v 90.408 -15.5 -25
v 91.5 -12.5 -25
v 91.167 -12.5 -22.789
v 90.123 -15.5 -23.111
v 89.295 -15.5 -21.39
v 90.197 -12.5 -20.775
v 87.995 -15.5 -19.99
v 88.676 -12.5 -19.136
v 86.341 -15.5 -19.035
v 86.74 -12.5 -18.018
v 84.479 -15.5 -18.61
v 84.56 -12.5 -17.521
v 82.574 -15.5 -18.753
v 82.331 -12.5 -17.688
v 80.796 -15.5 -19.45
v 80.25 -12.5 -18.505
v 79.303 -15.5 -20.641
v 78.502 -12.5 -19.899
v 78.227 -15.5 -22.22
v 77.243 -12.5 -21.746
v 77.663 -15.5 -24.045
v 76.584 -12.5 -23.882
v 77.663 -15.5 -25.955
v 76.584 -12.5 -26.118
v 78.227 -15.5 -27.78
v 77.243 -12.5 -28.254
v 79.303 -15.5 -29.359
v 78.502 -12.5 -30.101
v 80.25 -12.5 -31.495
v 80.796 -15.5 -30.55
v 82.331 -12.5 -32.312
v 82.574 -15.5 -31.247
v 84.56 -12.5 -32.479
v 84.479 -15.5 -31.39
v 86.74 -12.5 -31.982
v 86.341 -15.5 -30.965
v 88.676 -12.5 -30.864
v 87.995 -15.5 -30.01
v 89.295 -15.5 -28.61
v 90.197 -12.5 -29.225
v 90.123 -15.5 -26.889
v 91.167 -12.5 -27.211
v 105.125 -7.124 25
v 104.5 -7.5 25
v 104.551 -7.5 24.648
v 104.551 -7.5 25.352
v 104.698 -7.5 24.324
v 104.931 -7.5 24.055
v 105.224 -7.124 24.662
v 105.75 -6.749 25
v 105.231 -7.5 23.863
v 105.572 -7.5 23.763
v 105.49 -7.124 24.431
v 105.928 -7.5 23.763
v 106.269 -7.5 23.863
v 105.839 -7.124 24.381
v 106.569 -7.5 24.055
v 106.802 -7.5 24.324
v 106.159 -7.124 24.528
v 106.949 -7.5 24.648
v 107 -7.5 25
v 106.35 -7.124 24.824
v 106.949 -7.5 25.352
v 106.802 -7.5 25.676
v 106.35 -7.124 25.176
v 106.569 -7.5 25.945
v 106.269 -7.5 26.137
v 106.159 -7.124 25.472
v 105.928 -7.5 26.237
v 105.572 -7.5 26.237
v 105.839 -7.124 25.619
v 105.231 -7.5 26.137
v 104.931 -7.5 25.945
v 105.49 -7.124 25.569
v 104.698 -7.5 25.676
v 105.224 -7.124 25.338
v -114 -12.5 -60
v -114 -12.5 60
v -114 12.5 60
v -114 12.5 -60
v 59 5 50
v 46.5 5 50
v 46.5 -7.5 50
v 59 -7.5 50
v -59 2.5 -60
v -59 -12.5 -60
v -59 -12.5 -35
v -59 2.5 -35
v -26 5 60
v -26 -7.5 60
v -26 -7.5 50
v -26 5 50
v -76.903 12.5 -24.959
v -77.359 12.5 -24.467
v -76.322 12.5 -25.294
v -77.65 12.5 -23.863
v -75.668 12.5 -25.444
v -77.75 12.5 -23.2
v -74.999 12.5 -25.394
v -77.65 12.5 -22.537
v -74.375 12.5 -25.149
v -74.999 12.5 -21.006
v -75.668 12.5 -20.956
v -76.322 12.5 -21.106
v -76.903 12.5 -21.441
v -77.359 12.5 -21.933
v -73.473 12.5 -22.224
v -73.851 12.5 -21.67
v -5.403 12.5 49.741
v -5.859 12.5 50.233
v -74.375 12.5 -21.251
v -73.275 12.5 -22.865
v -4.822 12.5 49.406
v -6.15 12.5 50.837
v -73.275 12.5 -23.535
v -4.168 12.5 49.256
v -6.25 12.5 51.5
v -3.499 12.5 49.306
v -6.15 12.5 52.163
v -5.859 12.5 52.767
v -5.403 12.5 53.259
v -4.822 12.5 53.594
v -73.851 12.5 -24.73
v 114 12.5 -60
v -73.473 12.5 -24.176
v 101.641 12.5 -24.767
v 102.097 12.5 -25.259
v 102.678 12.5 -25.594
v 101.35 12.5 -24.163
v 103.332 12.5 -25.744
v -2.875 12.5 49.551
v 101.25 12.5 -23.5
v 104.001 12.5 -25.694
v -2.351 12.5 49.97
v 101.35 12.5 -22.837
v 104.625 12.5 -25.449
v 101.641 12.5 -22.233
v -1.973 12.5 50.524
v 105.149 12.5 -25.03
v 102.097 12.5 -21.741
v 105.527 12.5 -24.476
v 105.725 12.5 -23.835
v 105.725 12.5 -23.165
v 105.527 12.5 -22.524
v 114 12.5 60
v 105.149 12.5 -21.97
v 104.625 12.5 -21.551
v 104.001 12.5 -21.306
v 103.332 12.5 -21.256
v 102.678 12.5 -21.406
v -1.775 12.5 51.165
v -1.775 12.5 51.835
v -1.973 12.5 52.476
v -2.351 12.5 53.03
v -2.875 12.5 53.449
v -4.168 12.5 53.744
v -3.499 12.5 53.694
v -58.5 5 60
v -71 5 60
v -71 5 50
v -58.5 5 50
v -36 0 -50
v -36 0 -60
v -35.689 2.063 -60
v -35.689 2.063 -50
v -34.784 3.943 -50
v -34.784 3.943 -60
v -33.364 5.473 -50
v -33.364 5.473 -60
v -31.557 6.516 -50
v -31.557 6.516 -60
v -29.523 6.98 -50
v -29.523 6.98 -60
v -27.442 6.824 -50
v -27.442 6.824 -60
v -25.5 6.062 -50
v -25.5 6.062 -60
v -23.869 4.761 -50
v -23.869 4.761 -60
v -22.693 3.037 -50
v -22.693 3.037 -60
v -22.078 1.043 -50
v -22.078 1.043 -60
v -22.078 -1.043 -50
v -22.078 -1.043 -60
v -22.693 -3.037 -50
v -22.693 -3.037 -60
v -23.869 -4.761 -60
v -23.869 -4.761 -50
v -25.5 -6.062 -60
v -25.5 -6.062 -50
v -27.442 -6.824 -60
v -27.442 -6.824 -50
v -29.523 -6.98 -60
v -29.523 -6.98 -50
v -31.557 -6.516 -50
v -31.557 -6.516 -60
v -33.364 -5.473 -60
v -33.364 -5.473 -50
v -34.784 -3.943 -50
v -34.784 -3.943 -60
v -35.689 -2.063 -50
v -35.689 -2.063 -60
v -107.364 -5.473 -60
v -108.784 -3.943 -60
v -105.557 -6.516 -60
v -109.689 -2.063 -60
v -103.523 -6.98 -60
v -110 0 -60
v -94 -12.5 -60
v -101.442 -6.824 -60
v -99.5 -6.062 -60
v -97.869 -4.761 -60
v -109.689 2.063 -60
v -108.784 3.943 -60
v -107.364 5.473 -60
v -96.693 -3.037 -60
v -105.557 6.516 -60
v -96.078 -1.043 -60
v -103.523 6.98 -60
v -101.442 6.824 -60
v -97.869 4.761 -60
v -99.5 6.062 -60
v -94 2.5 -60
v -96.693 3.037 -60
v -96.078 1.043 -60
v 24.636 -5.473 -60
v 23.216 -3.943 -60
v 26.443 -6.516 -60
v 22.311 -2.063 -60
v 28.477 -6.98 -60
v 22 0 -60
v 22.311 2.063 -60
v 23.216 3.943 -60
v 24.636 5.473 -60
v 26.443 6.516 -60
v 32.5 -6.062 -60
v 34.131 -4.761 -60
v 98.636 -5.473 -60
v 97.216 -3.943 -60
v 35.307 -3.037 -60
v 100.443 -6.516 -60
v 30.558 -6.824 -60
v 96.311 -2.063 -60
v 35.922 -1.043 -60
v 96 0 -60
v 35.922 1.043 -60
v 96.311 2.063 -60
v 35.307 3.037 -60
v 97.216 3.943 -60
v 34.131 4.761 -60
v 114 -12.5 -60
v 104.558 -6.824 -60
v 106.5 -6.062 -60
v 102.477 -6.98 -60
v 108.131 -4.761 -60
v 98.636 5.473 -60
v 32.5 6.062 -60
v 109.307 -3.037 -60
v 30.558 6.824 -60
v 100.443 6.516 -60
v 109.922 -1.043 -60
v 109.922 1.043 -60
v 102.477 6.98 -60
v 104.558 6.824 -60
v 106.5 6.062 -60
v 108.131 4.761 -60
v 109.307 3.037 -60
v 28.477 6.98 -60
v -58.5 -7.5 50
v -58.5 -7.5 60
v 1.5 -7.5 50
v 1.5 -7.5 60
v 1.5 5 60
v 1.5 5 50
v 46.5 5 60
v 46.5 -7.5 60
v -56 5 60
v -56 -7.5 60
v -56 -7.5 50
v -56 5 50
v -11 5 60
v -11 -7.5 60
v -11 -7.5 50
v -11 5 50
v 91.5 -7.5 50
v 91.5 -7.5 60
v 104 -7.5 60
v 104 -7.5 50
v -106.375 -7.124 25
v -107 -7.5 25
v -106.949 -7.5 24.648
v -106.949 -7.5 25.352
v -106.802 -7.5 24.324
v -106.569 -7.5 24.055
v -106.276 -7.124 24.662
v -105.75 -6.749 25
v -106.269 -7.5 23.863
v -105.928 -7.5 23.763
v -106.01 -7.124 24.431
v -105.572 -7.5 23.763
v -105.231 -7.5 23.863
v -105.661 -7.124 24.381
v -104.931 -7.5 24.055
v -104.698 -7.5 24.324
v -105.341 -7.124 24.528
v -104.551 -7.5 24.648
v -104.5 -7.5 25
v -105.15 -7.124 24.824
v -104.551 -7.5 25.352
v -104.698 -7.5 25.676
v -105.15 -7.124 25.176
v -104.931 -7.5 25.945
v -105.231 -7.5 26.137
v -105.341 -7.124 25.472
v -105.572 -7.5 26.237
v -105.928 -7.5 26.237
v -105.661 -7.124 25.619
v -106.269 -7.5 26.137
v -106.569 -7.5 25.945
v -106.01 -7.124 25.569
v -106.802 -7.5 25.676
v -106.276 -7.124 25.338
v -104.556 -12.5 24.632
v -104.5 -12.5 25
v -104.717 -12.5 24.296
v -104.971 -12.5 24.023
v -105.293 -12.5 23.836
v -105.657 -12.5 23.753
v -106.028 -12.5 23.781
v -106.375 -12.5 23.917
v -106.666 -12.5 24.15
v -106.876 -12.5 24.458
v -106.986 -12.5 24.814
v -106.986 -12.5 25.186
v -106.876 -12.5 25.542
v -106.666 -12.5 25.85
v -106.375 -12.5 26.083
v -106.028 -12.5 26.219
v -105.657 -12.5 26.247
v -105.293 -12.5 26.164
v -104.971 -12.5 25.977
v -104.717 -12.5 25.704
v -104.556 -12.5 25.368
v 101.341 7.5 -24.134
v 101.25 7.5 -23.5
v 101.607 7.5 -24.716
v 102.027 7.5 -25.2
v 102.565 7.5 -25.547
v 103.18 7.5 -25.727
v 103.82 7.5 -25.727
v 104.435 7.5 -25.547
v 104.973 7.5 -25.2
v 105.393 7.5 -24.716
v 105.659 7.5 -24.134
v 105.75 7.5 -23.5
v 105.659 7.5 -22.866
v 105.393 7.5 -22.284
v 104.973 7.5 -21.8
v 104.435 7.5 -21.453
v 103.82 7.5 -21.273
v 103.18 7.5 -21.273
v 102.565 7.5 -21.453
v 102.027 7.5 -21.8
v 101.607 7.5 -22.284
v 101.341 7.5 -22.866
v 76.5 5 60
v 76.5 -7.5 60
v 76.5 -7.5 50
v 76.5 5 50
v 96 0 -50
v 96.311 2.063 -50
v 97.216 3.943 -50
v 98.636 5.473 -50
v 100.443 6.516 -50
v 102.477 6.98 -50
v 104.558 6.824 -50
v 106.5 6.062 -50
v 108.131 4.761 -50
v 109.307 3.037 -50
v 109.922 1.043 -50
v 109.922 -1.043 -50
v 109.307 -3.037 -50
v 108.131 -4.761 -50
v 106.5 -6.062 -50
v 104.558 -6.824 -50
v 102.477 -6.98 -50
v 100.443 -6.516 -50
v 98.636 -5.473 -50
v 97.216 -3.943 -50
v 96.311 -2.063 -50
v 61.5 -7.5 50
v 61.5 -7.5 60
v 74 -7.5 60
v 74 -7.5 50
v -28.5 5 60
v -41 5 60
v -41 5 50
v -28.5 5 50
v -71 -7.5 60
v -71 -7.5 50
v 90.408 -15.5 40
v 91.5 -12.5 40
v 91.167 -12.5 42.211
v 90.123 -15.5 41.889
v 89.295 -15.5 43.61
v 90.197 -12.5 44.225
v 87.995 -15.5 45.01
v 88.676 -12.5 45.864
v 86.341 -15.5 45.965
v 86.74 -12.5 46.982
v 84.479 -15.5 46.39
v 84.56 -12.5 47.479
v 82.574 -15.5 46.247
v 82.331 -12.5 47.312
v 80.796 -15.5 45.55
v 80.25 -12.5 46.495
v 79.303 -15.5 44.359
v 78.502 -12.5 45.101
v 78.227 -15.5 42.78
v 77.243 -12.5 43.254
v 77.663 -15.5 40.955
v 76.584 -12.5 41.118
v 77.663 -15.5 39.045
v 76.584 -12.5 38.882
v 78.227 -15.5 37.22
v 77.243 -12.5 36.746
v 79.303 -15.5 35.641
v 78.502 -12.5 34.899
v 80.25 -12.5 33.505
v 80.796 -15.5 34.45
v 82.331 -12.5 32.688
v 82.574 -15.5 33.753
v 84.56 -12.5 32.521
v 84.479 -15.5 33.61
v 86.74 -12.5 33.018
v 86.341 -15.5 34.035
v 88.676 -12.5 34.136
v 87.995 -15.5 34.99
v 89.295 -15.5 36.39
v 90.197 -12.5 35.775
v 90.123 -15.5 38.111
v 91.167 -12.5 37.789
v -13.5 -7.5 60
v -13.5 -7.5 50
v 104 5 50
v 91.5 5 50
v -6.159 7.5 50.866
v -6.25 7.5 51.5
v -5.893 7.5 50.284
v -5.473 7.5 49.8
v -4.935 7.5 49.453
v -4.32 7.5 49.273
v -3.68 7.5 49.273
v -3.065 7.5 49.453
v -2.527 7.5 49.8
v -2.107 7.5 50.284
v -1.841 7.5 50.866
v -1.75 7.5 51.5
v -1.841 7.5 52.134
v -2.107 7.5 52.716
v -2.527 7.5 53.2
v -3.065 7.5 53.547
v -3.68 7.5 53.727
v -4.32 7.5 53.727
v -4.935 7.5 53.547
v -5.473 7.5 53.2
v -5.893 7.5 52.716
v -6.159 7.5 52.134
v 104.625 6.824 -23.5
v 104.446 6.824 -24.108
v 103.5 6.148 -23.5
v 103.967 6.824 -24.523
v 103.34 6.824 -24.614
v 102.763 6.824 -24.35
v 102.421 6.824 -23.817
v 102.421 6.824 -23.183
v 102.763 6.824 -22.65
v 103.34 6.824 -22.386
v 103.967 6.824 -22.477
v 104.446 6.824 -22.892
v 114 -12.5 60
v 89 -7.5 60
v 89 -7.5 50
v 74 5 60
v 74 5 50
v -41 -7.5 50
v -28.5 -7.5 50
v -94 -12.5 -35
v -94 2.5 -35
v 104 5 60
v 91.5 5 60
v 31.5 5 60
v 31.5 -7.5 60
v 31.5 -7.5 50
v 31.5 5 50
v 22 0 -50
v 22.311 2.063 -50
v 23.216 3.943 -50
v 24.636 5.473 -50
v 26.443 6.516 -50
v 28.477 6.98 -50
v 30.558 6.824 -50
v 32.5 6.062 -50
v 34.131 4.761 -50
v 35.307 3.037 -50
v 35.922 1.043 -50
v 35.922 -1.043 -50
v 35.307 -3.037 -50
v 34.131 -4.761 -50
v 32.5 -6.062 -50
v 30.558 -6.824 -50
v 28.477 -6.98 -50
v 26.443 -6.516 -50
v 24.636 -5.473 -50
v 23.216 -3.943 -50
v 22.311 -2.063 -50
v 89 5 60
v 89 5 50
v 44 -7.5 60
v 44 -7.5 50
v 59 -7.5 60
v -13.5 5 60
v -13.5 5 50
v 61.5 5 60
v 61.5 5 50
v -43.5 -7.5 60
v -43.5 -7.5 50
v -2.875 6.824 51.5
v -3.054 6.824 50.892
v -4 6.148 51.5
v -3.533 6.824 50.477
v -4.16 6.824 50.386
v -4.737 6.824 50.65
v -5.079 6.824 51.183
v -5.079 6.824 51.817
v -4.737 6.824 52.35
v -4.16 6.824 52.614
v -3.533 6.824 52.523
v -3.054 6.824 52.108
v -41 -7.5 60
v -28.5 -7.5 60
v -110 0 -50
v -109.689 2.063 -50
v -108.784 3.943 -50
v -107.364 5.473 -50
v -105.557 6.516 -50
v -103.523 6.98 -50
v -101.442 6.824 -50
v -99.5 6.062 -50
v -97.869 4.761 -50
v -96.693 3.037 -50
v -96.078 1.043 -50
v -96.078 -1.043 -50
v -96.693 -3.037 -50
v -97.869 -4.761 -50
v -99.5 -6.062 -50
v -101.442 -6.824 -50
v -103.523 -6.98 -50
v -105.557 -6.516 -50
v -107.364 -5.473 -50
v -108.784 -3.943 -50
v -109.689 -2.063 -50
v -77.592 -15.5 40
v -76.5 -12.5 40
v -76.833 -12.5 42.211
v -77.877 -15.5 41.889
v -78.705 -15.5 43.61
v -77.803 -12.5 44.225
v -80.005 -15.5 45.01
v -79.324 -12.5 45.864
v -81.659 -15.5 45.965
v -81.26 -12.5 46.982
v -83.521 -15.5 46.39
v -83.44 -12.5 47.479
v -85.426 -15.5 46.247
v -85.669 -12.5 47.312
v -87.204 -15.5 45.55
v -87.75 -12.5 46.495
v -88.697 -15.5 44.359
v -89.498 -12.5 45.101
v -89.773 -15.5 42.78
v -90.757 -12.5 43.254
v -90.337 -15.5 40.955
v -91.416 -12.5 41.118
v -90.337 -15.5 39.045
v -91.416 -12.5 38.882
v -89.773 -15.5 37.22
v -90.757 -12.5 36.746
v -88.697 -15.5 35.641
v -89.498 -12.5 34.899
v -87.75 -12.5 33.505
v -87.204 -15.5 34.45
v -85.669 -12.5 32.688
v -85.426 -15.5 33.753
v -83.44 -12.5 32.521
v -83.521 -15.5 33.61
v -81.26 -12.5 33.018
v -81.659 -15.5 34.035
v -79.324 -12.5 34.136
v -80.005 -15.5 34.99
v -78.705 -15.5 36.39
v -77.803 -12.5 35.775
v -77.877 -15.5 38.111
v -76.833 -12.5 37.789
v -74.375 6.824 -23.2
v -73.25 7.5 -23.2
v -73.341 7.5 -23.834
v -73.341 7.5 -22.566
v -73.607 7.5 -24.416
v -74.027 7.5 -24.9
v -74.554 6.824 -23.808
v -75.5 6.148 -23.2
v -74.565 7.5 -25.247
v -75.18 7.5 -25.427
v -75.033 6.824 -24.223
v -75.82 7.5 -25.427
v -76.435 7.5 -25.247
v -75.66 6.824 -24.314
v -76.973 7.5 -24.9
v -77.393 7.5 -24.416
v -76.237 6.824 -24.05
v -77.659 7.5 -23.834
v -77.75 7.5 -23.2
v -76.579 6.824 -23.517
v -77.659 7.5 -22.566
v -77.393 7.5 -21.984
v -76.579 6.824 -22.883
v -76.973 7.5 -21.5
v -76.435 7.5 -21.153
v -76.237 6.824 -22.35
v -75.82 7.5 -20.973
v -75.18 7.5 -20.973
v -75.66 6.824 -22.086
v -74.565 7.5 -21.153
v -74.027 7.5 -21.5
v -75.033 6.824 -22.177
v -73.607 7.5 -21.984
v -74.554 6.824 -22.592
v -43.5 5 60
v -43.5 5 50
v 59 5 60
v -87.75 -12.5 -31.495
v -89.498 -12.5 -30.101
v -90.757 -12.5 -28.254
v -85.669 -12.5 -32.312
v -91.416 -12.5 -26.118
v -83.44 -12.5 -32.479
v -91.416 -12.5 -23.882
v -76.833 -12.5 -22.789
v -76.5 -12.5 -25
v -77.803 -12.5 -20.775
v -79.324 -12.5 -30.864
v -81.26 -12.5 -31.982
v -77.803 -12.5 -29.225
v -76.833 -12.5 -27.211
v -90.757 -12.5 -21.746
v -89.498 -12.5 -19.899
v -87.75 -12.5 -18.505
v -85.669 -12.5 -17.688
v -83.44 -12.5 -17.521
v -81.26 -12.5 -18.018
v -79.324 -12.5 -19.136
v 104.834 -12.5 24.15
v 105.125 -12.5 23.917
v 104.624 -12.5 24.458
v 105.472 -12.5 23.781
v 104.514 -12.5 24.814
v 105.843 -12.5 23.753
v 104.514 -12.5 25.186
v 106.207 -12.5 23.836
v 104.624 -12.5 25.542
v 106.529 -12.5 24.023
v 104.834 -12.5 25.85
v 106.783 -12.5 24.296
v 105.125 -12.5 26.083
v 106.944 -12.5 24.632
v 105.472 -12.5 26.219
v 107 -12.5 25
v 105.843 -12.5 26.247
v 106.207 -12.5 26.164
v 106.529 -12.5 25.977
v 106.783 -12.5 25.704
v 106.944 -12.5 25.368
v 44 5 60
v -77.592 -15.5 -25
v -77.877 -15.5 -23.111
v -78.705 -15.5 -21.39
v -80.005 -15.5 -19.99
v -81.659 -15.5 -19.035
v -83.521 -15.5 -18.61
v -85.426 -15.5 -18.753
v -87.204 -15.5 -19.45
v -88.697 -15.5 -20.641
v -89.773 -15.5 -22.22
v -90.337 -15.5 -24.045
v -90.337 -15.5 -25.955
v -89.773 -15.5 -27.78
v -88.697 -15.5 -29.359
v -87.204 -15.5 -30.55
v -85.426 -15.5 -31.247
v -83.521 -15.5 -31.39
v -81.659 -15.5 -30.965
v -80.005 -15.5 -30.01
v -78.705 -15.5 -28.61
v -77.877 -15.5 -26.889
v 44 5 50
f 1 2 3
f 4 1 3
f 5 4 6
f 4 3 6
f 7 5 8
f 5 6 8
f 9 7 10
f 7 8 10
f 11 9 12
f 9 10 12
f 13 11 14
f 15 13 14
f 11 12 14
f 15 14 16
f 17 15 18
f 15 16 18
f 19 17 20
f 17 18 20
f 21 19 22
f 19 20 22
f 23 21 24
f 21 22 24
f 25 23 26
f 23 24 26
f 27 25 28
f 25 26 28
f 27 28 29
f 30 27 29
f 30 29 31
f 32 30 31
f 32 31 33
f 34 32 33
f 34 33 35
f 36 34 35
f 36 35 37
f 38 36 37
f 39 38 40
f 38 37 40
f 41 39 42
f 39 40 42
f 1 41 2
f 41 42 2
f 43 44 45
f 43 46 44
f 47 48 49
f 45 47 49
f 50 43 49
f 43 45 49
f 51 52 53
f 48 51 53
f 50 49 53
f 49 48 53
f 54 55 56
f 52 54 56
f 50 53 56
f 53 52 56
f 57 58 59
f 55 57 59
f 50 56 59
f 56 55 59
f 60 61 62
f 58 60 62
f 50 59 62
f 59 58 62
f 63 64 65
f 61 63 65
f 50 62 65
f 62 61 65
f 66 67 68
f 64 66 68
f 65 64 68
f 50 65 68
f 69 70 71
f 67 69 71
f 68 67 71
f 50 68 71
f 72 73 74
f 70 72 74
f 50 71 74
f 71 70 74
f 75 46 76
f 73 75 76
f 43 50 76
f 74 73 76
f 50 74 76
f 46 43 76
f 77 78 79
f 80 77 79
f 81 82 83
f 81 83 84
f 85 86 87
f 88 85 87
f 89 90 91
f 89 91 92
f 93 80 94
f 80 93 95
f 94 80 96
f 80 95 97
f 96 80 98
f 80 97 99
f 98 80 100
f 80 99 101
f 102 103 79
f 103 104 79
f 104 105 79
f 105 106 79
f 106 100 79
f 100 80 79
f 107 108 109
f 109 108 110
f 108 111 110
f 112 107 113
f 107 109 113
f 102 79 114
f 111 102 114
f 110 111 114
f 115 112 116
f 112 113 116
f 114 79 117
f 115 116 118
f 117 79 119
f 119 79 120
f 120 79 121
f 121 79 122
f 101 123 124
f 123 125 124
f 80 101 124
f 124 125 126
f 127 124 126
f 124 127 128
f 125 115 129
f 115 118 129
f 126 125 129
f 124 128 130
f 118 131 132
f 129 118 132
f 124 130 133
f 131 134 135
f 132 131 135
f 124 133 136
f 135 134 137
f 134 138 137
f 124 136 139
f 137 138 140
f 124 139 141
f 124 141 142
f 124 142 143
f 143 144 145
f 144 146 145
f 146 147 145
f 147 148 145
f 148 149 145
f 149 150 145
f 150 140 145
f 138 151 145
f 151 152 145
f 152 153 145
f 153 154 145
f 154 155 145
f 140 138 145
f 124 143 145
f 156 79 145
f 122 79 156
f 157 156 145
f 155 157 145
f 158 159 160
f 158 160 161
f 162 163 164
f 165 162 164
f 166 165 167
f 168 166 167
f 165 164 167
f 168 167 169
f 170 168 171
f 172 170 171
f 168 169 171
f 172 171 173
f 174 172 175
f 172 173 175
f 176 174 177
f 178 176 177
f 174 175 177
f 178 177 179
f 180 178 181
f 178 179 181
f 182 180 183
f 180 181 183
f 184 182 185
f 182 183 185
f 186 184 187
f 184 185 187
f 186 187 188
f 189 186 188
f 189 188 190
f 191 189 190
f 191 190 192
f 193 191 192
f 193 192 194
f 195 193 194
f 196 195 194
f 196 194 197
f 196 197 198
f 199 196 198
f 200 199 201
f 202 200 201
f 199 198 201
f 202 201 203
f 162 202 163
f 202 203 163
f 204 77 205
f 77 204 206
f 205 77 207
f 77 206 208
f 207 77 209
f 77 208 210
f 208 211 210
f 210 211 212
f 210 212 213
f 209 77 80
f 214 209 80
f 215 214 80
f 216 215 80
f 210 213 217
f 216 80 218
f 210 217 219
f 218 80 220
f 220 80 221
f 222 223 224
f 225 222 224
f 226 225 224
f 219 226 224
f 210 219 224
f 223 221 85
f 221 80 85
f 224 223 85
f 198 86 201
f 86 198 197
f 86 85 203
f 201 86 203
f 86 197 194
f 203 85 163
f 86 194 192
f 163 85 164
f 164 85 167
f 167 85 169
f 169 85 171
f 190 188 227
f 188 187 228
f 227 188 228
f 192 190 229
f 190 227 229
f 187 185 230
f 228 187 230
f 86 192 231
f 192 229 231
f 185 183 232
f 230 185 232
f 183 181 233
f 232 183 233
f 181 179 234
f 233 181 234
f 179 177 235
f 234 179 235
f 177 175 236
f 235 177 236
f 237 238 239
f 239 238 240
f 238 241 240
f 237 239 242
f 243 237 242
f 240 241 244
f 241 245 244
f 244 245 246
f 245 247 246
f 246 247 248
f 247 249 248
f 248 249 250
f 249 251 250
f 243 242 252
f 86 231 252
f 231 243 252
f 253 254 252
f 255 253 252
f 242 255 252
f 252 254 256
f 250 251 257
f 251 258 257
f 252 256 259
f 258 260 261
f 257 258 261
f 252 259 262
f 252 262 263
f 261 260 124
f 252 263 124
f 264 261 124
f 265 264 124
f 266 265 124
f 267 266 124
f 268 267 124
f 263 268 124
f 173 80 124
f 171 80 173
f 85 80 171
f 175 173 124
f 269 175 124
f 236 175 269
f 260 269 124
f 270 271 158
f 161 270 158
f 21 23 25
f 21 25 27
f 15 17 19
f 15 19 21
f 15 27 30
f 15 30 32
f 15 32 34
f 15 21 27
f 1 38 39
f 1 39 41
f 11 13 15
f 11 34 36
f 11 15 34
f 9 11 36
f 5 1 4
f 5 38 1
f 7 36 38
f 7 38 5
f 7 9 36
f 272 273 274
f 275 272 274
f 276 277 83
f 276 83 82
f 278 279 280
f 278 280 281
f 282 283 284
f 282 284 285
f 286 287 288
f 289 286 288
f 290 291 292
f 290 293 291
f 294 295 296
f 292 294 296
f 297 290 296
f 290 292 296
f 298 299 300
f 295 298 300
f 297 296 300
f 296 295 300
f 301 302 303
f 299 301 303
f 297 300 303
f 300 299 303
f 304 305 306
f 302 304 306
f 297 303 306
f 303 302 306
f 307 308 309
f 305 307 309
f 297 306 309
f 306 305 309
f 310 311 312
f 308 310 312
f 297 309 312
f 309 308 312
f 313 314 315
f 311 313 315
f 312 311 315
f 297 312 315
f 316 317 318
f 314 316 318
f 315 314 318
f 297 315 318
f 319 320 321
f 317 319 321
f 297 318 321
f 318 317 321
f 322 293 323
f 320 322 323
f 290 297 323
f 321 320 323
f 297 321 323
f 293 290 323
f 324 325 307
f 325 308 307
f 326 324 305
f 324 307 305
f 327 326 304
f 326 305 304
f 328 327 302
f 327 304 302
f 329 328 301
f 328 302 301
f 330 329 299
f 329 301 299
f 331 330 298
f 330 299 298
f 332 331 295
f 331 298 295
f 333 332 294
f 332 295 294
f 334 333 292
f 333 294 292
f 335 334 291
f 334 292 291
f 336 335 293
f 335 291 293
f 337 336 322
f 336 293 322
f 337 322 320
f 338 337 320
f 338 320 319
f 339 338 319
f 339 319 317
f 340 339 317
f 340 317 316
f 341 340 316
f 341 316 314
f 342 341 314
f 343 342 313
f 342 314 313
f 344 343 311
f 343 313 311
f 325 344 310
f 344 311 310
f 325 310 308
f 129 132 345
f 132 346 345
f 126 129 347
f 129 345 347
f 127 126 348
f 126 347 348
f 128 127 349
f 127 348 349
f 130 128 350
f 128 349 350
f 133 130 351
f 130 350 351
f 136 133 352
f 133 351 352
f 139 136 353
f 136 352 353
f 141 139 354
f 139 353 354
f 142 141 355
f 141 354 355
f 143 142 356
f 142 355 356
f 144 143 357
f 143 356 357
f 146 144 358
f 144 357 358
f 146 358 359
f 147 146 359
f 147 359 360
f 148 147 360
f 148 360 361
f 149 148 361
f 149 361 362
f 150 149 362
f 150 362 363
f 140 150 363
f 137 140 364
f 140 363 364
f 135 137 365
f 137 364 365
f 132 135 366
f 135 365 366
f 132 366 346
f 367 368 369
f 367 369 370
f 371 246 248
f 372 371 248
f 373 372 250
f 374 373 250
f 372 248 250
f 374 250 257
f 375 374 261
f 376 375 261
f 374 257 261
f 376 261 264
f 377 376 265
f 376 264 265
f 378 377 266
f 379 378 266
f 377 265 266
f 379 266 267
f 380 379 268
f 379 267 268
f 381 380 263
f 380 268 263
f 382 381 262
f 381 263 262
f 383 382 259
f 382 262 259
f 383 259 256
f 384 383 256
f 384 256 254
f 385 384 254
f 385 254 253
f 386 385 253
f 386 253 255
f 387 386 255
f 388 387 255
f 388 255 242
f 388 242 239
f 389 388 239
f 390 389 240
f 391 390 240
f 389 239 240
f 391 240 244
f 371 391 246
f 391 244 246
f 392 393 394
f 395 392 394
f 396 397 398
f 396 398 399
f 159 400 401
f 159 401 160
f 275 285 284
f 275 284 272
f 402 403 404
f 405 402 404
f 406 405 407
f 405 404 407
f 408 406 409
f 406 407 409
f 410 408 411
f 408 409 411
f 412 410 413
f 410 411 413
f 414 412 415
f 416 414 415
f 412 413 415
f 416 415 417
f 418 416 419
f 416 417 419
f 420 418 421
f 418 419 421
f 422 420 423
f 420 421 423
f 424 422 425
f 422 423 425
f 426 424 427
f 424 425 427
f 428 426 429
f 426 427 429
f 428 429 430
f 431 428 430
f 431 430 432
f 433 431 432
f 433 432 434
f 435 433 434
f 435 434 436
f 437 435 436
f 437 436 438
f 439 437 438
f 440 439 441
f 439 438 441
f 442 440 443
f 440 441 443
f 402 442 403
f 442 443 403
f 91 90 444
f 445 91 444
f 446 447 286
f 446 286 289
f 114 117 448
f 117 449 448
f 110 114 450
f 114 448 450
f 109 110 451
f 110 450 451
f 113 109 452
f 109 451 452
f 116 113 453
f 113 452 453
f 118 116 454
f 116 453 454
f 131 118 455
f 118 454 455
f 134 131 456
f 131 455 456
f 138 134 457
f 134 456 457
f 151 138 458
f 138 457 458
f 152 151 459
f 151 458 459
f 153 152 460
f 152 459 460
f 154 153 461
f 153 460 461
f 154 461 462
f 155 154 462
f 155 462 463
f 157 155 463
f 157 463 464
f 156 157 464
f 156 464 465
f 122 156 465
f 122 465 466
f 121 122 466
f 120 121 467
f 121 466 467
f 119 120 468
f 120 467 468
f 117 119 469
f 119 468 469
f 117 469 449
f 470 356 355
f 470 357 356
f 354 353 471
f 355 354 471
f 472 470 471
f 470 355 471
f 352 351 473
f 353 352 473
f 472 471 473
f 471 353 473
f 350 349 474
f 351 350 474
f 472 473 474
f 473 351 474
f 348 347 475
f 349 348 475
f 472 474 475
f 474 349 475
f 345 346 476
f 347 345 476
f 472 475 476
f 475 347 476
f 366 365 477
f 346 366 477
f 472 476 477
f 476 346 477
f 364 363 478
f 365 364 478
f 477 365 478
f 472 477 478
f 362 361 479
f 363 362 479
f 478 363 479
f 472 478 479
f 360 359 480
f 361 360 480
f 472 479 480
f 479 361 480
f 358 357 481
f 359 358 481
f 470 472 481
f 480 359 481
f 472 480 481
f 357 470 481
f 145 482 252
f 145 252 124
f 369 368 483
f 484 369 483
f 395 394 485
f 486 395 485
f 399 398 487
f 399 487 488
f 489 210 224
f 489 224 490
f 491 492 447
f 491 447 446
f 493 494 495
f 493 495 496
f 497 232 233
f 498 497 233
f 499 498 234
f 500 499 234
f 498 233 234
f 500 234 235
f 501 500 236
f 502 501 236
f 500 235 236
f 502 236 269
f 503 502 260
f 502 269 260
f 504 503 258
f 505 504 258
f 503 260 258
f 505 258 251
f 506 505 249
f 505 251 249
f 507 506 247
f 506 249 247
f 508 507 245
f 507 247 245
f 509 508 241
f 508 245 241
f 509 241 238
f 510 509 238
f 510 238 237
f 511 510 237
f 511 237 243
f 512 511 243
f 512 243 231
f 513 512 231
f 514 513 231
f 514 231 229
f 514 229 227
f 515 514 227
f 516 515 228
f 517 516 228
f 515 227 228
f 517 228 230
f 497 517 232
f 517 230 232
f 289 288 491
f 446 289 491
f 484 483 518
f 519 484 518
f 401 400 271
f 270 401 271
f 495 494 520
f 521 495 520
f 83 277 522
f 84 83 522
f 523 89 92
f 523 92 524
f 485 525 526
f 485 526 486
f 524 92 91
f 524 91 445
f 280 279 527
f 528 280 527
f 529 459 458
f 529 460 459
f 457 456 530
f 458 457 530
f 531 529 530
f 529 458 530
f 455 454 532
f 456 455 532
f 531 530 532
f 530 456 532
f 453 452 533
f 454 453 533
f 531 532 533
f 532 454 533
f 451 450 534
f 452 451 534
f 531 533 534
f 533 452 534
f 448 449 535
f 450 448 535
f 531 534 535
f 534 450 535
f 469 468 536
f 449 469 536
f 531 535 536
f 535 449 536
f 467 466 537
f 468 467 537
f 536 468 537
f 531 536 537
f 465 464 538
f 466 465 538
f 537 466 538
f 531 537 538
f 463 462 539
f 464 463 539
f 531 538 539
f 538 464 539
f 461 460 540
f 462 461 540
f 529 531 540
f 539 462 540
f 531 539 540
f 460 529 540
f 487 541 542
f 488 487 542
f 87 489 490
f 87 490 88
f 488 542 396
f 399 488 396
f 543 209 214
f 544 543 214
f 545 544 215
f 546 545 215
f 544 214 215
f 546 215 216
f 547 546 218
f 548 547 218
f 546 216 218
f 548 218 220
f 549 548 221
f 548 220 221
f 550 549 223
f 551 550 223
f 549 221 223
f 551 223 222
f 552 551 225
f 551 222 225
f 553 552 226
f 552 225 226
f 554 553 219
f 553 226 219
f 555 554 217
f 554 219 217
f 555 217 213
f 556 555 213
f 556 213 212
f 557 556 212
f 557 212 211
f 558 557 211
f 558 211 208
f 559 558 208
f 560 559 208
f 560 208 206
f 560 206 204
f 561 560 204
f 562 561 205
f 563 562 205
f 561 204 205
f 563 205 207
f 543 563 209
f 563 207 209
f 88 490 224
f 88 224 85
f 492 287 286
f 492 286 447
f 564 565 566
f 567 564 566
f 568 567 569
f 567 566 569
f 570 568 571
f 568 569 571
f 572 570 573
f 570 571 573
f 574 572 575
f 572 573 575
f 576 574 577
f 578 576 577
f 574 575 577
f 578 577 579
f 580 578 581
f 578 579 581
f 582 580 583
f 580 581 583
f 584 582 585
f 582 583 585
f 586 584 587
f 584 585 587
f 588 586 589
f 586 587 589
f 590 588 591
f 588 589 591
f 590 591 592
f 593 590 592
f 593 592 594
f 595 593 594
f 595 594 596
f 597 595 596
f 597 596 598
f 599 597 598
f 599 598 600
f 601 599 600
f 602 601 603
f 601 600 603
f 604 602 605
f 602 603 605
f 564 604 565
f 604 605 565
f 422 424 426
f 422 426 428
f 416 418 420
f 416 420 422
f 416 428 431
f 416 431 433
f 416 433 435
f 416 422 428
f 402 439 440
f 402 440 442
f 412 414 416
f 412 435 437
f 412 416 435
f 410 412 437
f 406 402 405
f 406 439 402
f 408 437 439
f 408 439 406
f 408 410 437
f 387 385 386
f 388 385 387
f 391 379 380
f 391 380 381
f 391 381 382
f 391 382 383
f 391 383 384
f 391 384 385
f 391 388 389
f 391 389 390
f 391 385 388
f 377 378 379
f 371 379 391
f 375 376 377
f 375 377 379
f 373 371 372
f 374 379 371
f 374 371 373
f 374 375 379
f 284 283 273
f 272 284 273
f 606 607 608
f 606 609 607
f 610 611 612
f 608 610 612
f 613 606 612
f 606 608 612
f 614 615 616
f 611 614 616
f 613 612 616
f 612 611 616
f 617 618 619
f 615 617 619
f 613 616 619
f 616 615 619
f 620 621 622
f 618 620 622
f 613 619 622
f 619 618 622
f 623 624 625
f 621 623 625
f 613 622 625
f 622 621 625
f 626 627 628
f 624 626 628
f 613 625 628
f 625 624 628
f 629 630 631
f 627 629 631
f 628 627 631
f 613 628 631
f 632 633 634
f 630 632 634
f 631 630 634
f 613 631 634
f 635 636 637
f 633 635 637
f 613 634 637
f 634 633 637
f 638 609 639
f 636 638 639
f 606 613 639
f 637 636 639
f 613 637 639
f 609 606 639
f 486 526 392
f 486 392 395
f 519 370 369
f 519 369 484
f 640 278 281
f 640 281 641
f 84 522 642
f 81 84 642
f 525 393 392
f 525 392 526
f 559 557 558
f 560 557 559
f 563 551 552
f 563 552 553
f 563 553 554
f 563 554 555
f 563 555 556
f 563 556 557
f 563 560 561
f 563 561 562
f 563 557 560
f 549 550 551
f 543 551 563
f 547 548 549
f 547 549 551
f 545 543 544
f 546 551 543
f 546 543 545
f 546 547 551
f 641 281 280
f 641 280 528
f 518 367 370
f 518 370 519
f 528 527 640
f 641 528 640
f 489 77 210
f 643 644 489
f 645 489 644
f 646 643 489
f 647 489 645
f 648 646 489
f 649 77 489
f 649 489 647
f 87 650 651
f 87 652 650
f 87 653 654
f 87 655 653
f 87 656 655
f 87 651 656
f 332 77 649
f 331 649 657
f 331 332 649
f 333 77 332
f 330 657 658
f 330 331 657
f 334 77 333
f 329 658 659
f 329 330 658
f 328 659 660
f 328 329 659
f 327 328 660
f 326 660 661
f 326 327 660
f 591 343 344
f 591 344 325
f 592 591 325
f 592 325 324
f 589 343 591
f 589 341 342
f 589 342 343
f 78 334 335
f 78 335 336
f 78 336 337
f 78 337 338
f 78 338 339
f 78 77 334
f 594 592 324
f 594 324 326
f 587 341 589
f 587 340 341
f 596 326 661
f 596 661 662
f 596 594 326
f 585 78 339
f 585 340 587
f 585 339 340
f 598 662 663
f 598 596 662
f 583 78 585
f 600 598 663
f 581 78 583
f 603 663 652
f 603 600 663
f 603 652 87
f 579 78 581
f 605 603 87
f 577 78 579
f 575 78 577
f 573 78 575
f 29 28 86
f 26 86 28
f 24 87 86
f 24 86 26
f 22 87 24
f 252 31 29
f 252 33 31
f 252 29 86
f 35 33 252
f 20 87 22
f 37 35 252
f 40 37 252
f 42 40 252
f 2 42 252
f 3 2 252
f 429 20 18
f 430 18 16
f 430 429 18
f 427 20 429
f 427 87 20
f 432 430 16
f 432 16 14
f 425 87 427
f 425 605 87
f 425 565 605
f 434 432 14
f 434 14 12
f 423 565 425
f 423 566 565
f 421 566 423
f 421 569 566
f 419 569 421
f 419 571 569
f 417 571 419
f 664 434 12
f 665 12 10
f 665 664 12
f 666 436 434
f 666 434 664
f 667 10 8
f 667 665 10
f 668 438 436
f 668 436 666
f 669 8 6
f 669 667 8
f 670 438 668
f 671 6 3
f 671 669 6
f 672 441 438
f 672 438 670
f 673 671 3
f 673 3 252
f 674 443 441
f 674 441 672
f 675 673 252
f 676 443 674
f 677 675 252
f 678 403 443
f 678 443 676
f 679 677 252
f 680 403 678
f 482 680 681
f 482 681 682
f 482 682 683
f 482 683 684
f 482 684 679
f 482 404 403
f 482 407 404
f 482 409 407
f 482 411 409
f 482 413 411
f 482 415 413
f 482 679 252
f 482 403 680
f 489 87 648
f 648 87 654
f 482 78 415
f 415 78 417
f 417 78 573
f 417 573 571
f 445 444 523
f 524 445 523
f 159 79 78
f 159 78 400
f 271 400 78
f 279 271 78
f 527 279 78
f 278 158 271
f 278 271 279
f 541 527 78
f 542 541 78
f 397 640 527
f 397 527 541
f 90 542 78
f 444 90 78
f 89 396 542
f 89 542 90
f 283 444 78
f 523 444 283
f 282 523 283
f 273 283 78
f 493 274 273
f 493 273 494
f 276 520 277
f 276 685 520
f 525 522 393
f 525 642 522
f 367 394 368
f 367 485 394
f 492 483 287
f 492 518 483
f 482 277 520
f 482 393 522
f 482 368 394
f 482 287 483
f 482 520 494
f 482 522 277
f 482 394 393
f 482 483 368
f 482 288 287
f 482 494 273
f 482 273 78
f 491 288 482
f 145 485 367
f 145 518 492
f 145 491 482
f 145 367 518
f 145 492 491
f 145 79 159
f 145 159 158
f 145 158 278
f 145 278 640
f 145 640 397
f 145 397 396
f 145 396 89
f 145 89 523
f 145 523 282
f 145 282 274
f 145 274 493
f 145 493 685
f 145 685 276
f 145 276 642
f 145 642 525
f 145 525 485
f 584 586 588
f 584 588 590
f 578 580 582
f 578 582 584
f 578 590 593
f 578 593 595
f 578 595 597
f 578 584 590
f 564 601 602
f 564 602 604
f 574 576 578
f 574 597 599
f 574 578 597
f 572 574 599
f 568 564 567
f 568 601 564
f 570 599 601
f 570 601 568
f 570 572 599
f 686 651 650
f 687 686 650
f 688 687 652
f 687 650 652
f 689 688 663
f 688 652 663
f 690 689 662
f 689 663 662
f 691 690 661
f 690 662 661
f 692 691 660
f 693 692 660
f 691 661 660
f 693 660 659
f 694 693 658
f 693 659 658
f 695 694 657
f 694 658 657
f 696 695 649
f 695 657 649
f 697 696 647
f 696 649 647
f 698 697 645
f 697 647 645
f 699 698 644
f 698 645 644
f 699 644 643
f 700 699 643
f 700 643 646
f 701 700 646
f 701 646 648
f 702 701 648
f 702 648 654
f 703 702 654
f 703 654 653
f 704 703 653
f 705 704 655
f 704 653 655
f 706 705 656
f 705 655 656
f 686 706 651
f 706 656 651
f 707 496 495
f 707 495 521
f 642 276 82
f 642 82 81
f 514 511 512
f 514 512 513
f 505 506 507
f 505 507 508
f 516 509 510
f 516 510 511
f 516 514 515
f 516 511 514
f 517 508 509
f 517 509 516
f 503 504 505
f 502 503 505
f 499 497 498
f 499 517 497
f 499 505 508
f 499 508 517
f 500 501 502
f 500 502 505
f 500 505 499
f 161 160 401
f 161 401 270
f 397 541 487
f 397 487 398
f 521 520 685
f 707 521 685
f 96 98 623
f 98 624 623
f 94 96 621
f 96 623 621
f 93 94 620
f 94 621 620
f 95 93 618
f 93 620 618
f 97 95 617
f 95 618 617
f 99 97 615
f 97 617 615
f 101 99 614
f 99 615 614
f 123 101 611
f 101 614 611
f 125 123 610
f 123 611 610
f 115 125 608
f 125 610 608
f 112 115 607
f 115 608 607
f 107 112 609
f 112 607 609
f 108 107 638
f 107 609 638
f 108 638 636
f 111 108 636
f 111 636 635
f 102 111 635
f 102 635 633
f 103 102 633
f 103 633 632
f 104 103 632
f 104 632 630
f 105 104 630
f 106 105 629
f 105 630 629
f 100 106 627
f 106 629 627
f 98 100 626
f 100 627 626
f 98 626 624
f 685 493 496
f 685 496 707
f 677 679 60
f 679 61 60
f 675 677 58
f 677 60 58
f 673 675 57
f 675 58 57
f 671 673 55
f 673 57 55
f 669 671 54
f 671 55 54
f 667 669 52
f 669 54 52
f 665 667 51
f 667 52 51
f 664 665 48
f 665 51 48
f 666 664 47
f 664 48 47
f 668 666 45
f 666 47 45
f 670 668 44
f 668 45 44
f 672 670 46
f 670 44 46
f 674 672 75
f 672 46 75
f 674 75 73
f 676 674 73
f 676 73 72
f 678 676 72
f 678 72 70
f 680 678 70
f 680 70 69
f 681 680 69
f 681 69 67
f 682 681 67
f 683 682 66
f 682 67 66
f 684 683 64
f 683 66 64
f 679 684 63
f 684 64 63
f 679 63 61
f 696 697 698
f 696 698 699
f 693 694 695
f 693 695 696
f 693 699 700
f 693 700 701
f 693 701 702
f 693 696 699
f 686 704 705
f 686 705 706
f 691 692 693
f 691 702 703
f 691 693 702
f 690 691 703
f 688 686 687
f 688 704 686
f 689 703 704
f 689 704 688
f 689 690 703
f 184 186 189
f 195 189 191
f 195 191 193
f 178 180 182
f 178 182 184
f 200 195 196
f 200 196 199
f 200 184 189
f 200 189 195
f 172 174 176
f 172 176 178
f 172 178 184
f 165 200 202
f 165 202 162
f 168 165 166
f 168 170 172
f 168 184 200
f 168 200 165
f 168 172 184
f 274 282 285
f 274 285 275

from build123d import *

# Parameters (mm, degrees)
SKETCH1_W                              = 228
SKETCH1_H                              = 25
BOSS_EXTRUDE1_DEPTH                    = 60
SKETCH3_W                              = 12.5
SKETCH3_H                              = 12.5
CUT_EXTRUDE2_DEPTH                     = 10
LPATTERN1_COUNT                        = 2
LPATTERN1_PITCH                        = 102.5
SKETCH7_R                              = 7.5
BOSS_EXTRUDE4_DEPTH                    = 3
BOSS_EXTRUDE4_DRAFT                    = 20
BOSS_EXTRUDE4_PROFILE_2_DEPTH          = 3
BOSS_EXTRUDE4_PROFILE_2_DRAFT          = 20
BOSS_EXTRUDE4_PROFILE_3_DEPTH          = 3
BOSS_EXTRUDE4_PROFILE_3_DRAFT          = 20
BOSS_EXTRUDE4_PROFILE_4_DEPTH          = 3
BOSS_EXTRUDE4_PROFILE_4_DRAFT          = 20
M3X0_5_TAPPED_HOLE1_D                  = 2.5
M3X0_5_TAPPED_HOLE1_DEPTH              = 5
M3X0_5_TAPPED_HOLE1_TIP                = 0.751075774
SKETCH12_W                             = 35
SKETCH12_H                             = 25
CUT_EXTRUDE3_DEPTH                     = 15
SKETCH6_R                              = 7
CUT_EXTRUDE4_DEPTH                     = 10
F_4_5_4_5_DRILL_BIT_FOR_PEM_NUTS_D     = 4.5
F_4_5_4_5_DRILL_BIT_FOR_PEM_NUTS_DEPTH = 5
F_4_5_4_5_DRILL_BIT_FOR_PEM_NUTS_TIP   = 1.351936393


with BuildPart() as part:
    # Sketch1 → Boss-Extrude1 (new, symmetric)
    with BuildSketch(Plane.XY):
        Rectangle(SKETCH1_W, SKETCH1_H)
    extrude(amount=BOSS_EXTRUDE1_DEPTH, both=True)

    # Sketch3 → Cut-Extrude2 (cut)
    with BuildSketch(Plane.XY.offset(60)):
        with Locations((82.75, -1.25)):
            Rectangle(SKETCH3_W, SKETCH3_H)
        with Locations((97.75, -1.25)):
            Rectangle(SKETCH3_W, SKETCH3_H)
        with Locations((67.75, -1.25)):
            Rectangle(SKETCH3_W, SKETCH3_H)
        with Locations((52.75, -1.25)):
            Rectangle(SKETCH3_W, SKETCH3_H)
        with Locations((37.75, -1.25)):
            Rectangle(SKETCH3_W, SKETCH3_H)
    cut_extrude2 = extrude(amount=-CUT_EXTRUDE2_DEPTH, mode=Mode.SUBTRACT)

    # LPattern1: Cut-Extrude2 ×2
    with Locations(*[(-i * LPATTERN1_PITCH, 0, 0) for i in range(1, LPATTERN1_COUNT)]):
        add(cut_extrude2, mode=Mode.SUBTRACT)


with BuildPart() as boss_extrude4_tool:
    # Sketch7 → Boss-Extrude4 (with draft: the straight prism first)
    with BuildSketch(Plane.XZ.offset(12.5)):
        with Locations((-84, -25)):
            Circle(SKETCH7_R)
    extrude(amount=BOSS_EXTRUDE4_DEPTH)
    # Boss-Extrude4: the draft: its side faces are tilted about the plane it starts from
    boss_extrude4_sides = [boss_extrude4_tool.faces().sort_by_distance(p)[0] for p in [
        (-91.5, -14, -25),
    ]]
    draft(boss_extrude4_sides, Plane.XZ.offset(12.5), BOSS_EXTRUDE4_DRAFT)


with BuildPart() as part_1:
    add(part.part)

    # Boss-Extrude4: add boss_extrude4_tool
    add(boss_extrude4_tool.part)


with BuildPart() as boss_extrude4_profile_2_tool:
    # Sketch7 → Boss-Extrude4 profile 2 (with draft: the straight prism first)
    with BuildSketch(Plane.XZ.offset(12.5)):
        with Locations((-84, 40)):
            Circle(SKETCH7_R)
    extrude(amount=BOSS_EXTRUDE4_PROFILE_2_DEPTH)
    # Boss-Extrude4 profile 2: the draft: its side faces are tilted about the plane it starts from
    boss_extrude4_profile_2_sides = [boss_extrude4_profile_2_tool.faces().sort_by_distance(p)[0] for p in [
        (-91.5, -14, 40),
    ]]
    draft(boss_extrude4_profile_2_sides, Plane.XZ.offset(12.5), BOSS_EXTRUDE4_PROFILE_2_DRAFT)


with BuildPart() as part_2:
    add(part_1.part)

    # Boss-Extrude4 profile 2: add boss_extrude4_profile_2_tool
    add(boss_extrude4_profile_2_tool.part)


with BuildPart() as boss_extrude4_profile_3_tool:
    # Sketch7 → Boss-Extrude4 profile 3 (with draft: the straight prism first)
    with BuildSketch(Plane.XZ.offset(12.5)):
        with Locations((84, 40)):
            Circle(SKETCH7_R)
    extrude(amount=BOSS_EXTRUDE4_PROFILE_3_DEPTH)
    # Boss-Extrude4 profile 3: the draft: its side faces are tilted about the plane it starts from
    boss_extrude4_profile_3_sides = [boss_extrude4_profile_3_tool.faces().sort_by_distance(p)[0] for p in [
        (76.5, -14, 40),
    ]]
    draft(boss_extrude4_profile_3_sides, Plane.XZ.offset(12.5), BOSS_EXTRUDE4_PROFILE_3_DRAFT)


with BuildPart() as part_3:
    add(part_2.part)

    # Boss-Extrude4 profile 3: add boss_extrude4_profile_3_tool
    add(boss_extrude4_profile_3_tool.part)


with BuildPart() as boss_extrude4_profile_4_tool:
    # Sketch7 → Boss-Extrude4 profile 4 (with draft: the straight prism first)
    with BuildSketch(Plane.XZ.offset(12.5)):
        with Locations((84, -25)):
            Circle(SKETCH7_R)
    extrude(amount=BOSS_EXTRUDE4_PROFILE_4_DEPTH)
    # Boss-Extrude4 profile 4: the draft: its side faces are tilted about the plane it starts from
    boss_extrude4_profile_4_sides = [boss_extrude4_profile_4_tool.faces().sort_by_distance(p)[0] for p in [
        (76.5, -14, -25),
    ]]
    draft(boss_extrude4_profile_4_sides, Plane.XZ.offset(12.5), BOSS_EXTRUDE4_PROFILE_4_DRAFT)


with BuildPart() as part_4:
    add(part_3.part)

    # Boss-Extrude4 profile 4: add boss_extrude4_profile_4_tool
    add(boss_extrude4_profile_4_tool.part)

    # M3x0.5 Tapped Hole1
    with Locations(Plane(origin=(0, -12.5, 0), x_dir=(-1, 0, 0), z_dir=(0, -1, 0))):
        with Locations((105.75, -25), (-105.75, -25)):
            Hole(M3X0_5_TAPPED_HOLE1_D / 2, depth=M3X0_5_TAPPED_HOLE1_DEPTH)
            with Locations((0, 0, -(M3X0_5_TAPPED_HOLE1_DEPTH + M3X0_5_TAPPED_HOLE1_TIP / 2))):  # 118° drill point
                Cone(0, M3X0_5_TAPPED_HOLE1_D / 2, M3X0_5_TAPPED_HOLE1_TIP, mode=Mode.SUBTRACT)

    # Sketch12 → Cut-Extrude3 (cut)
    with BuildSketch(Plane.XZ.offset(12.5)):
        with Locations((-76.5, -47.5)):
            Rectangle(SKETCH12_W, SKETCH12_H)
    extrude(amount=-CUT_EXTRUDE3_DEPTH, mode=Mode.SUBTRACT)

    # Sketch6 → Cut-Extrude4 (cut)
    with BuildSketch(Plane(origin=(0, 0, -60), x_dir=(-1, 0, 0), z_dir=(0, 0, -1))):
        with Locations((-103, 0)):
            Circle(SKETCH6_R)
        with Locations((-29, 0)):
            Circle(SKETCH6_R)
        with Locations((29, 0)):
            Circle(SKETCH6_R)
        with Locations((103, 0)):
            Circle(SKETCH6_R)
    extrude(amount=-CUT_EXTRUDE4_DEPTH, mode=Mode.SUBTRACT)

    # Ø4.5 (4.5) Drill Bit for PEM Nuts
    with Locations(Plane(origin=(0, 12.5, 0), x_dir=(1, 0, 0), z_dir=(0, 1, 0))):
        with Locations((-4, -51.5), (-75.5, 23.2), (103.5, 23.5)):
            Hole(F_4_5_4_5_DRILL_BIT_FOR_PEM_NUTS_D / 2, depth=F_4_5_4_5_DRILL_BIT_FOR_PEM_NUTS_DEPTH)
            with Locations((0, 0, -(F_4_5_4_5_DRILL_BIT_FOR_PEM_NUTS_DEPTH + F_4_5_4_5_DRILL_BIT_FOR_PEM_NUTS_TIP / 2))):  # 118° drill point
                Cone(0, F_4_5_4_5_DRILL_BIT_FOR_PEM_NUTS_D / 2, F_4_5_4_5_DRILL_BIT_FOR_PEM_NUTS_TIP, mode=Mode.SUBTRACT)


solid = part_4.part
